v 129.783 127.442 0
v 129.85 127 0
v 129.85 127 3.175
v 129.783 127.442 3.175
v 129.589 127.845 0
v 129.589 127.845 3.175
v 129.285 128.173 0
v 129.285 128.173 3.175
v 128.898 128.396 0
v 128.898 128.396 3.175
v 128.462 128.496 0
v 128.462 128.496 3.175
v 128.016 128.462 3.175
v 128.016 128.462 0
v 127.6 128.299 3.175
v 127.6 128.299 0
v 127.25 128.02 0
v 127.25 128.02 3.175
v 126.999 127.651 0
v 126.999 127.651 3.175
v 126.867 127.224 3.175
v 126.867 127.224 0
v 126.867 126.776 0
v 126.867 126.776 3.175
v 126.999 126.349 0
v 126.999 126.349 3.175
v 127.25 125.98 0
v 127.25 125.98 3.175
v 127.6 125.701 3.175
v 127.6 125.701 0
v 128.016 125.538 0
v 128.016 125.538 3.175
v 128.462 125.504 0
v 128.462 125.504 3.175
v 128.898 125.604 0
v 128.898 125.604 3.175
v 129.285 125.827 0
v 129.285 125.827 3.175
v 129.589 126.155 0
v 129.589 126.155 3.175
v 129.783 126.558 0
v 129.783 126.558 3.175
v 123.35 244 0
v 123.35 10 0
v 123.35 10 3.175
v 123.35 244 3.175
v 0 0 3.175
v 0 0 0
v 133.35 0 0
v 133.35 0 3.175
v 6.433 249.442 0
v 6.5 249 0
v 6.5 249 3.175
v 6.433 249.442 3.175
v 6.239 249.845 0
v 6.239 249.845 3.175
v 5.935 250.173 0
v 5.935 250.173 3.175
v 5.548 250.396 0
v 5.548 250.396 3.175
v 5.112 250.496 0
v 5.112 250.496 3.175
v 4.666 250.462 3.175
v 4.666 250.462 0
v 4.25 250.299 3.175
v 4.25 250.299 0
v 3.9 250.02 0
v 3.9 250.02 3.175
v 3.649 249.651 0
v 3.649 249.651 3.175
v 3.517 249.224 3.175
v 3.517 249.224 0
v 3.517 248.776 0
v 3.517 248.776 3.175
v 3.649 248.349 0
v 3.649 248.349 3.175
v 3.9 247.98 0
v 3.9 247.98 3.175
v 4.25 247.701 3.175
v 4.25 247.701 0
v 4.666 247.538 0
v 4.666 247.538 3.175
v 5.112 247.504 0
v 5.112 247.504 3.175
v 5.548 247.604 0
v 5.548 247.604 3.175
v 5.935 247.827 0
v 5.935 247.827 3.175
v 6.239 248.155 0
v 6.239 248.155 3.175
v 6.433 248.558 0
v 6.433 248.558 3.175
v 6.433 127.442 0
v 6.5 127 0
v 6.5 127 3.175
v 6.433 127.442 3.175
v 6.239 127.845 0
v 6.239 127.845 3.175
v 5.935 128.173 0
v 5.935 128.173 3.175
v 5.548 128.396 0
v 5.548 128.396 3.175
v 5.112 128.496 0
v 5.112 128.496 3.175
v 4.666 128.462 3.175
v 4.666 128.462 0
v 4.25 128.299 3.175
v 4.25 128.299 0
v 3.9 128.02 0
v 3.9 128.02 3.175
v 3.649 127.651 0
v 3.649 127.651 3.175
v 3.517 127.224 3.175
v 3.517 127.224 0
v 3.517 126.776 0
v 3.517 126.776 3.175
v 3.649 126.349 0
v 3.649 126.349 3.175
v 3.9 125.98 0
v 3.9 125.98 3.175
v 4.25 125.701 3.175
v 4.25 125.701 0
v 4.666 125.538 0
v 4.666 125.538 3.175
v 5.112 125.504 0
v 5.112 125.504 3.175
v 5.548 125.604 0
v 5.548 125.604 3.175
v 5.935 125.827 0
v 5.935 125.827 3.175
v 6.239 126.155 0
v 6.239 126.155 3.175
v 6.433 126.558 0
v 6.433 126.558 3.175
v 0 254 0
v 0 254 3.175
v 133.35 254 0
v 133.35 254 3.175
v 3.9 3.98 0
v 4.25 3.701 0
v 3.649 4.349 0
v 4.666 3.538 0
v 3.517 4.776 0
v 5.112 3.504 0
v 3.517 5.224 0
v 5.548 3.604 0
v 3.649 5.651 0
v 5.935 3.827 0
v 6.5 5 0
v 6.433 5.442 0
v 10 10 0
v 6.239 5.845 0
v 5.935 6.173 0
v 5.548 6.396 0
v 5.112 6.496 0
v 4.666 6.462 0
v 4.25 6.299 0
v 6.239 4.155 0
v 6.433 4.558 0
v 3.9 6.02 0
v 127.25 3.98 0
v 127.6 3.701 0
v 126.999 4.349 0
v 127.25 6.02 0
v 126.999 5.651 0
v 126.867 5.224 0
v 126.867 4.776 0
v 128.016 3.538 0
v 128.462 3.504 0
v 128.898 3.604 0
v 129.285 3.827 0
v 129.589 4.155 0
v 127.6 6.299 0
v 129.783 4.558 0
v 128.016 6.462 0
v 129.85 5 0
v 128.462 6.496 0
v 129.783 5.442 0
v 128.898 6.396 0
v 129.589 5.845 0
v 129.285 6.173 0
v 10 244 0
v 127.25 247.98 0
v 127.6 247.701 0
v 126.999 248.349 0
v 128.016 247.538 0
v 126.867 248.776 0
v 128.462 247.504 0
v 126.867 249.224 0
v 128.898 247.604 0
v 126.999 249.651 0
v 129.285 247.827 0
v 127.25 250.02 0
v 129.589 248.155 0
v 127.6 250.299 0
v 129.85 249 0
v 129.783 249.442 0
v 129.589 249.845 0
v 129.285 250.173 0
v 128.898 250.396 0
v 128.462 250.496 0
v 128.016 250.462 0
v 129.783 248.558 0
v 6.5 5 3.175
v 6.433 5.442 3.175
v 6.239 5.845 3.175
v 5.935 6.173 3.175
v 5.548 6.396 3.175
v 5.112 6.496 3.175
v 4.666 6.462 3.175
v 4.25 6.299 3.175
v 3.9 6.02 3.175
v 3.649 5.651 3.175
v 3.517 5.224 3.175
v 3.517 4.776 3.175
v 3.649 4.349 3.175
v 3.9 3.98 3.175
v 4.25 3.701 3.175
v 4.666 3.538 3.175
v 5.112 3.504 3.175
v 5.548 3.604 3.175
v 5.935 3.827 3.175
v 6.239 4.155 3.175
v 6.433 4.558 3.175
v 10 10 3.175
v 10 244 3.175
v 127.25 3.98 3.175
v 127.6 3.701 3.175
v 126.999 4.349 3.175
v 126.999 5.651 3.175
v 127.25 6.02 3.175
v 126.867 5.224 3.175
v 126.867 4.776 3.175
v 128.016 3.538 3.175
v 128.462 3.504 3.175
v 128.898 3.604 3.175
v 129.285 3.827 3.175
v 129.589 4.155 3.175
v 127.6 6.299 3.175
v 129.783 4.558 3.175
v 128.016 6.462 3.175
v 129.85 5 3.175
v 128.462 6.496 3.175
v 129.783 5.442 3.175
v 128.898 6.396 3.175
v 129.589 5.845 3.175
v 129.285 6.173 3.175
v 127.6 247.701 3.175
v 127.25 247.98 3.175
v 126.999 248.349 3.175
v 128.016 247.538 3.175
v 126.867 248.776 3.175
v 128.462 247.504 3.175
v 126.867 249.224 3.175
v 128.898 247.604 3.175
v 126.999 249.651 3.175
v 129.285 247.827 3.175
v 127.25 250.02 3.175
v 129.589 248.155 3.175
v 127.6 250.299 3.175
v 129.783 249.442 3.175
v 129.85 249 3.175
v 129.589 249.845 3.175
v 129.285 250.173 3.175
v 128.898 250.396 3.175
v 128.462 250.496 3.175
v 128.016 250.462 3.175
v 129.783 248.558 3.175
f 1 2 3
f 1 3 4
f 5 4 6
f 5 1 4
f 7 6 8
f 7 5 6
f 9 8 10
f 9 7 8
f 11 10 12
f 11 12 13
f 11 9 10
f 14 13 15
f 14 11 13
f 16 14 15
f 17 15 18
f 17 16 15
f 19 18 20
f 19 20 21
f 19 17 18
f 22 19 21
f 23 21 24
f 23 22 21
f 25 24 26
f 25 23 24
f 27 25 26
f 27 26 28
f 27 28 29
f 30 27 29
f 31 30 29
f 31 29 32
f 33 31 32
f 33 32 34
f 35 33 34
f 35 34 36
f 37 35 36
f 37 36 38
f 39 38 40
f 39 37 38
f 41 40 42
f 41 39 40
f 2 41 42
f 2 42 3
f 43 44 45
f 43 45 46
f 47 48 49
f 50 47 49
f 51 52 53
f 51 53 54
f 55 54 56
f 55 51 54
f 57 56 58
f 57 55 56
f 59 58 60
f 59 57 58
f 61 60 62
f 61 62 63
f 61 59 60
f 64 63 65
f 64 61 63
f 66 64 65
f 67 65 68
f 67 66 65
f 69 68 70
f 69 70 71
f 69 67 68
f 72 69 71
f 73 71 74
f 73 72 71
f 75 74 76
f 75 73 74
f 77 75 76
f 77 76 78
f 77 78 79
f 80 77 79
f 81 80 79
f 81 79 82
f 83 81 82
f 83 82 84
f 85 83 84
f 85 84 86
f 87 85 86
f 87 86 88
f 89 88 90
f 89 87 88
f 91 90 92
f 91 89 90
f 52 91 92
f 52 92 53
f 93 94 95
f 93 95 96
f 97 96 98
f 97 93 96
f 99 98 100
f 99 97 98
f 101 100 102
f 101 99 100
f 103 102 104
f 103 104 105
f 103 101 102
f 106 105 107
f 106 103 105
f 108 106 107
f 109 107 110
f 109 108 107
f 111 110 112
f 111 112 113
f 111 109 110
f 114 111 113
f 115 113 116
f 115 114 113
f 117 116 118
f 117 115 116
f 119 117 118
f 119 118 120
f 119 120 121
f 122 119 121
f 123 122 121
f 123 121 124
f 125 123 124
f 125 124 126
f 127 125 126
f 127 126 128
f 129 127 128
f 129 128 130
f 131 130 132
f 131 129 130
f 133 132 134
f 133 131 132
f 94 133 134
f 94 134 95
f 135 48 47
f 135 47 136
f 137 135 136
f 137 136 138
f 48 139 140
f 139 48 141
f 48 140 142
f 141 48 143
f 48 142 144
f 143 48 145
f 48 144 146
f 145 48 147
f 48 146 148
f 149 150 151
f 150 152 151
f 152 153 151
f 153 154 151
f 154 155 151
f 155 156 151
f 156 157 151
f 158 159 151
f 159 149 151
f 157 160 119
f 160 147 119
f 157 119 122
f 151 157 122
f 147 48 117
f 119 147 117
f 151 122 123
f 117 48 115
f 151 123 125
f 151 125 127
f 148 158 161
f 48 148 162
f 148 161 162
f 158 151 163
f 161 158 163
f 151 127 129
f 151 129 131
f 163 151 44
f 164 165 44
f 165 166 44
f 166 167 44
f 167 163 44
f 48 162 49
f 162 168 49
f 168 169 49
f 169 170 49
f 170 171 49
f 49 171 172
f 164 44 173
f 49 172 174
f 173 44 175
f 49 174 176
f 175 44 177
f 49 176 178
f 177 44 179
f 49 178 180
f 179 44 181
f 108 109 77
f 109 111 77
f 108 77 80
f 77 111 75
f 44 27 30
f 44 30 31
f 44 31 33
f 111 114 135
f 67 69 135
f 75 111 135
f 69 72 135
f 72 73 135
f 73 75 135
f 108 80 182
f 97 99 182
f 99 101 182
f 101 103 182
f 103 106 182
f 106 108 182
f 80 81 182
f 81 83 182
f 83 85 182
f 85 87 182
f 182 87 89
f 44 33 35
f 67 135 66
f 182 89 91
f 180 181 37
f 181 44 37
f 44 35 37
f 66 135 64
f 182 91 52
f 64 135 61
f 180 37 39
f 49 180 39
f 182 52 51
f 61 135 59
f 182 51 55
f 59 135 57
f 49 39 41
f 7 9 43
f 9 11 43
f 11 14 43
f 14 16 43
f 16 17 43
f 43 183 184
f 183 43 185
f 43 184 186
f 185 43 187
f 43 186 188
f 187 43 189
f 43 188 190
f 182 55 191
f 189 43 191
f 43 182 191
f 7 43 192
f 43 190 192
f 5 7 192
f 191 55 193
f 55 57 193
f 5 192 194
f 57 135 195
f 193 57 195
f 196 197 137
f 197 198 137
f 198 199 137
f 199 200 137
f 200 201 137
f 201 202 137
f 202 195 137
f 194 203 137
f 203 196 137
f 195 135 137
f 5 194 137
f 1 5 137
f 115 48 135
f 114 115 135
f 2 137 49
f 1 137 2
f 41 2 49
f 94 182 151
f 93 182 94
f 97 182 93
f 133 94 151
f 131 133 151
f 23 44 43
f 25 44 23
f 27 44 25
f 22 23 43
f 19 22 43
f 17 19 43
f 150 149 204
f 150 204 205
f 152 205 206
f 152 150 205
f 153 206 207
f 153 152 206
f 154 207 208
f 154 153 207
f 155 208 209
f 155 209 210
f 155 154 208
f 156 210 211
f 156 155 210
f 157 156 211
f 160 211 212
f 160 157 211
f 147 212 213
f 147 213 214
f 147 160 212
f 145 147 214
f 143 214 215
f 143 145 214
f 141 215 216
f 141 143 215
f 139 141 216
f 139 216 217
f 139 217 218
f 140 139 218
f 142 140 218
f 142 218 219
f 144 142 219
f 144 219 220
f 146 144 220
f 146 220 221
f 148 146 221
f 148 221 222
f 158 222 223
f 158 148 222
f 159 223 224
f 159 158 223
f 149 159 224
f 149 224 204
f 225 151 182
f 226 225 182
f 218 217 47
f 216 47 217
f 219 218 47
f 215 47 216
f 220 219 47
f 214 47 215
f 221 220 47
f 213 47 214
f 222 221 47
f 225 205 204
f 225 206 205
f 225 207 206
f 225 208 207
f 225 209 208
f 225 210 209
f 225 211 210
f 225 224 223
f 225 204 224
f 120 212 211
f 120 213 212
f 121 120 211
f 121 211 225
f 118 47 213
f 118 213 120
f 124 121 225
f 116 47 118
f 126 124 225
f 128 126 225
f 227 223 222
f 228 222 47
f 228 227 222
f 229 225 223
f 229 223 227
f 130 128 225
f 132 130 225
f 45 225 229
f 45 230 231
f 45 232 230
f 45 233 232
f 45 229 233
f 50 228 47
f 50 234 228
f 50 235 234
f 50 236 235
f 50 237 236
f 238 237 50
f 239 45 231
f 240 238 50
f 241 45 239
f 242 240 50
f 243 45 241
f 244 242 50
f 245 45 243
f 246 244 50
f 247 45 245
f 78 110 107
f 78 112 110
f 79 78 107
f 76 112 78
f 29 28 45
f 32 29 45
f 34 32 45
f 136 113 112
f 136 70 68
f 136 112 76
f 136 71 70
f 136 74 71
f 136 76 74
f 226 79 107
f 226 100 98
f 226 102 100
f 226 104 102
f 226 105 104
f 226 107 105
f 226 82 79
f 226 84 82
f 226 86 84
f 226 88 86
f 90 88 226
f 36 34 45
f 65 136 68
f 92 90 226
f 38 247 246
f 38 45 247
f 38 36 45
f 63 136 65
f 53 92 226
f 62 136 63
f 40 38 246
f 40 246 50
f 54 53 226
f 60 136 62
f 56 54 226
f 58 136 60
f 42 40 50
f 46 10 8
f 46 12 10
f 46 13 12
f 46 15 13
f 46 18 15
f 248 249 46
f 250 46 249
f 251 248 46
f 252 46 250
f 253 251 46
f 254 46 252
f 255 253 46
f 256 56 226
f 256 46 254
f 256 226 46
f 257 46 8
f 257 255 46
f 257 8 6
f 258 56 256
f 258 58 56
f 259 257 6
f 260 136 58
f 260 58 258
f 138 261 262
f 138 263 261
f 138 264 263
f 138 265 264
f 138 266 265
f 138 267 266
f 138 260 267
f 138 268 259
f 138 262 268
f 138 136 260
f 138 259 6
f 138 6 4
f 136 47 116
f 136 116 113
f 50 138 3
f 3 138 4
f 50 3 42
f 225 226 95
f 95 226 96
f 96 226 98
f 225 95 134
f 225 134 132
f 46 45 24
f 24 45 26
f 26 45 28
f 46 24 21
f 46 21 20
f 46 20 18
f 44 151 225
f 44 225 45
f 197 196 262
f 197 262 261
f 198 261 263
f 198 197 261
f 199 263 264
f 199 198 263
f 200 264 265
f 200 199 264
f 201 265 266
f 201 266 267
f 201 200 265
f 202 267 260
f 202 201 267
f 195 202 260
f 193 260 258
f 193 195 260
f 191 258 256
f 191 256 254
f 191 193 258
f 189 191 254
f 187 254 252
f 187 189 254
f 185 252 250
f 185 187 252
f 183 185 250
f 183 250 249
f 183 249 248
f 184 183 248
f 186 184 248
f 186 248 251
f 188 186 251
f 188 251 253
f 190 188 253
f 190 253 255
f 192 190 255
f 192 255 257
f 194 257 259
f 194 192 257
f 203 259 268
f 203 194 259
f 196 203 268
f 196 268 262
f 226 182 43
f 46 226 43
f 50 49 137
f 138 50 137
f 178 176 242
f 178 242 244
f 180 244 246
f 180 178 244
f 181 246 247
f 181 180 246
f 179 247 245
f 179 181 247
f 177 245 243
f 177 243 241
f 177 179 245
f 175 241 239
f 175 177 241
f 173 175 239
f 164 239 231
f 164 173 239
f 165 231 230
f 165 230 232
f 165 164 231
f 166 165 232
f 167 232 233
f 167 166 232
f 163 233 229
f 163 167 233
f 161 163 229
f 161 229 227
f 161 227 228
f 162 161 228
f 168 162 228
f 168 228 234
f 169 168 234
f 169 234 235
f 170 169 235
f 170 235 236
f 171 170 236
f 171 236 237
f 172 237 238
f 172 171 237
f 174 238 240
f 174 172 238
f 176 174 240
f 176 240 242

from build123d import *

# Parameters (mm, degrees)
SKETCH1_W           = 133.35
SKETCH1_H           = 254
SKETCH1_R           = 1.5
SKETCH1_W_2         = 113.35
SKETCH1_H_2         = 234
BOSS_EXTRUDE1_DEPTH = 3.175


with BuildPart() as part:
    # Sketch1 → Boss-Extrude1 (new body)
    with BuildSketch(Plane.XY):
        with Locations((66.675, 127)):
            Rectangle(SKETCH1_W, SKETCH1_H)
        with Locations((5, 5)):
            Circle(SKETCH1_R, mode=Mode.SUBTRACT)
        with Locations((5, 249)):
            Circle(SKETCH1_R, mode=Mode.SUBTRACT)
        with Locations((5, 127)):
            Circle(SKETCH1_R, mode=Mode.SUBTRACT)
        with Locations((128.35, 249)):
            Circle(SKETCH1_R, mode=Mode.SUBTRACT)
        with Locations((128.35, 127)):
            Circle(SKETCH1_R, mode=Mode.SUBTRACT)
        with Locations((128.35, 5)):
            Circle(SKETCH1_R, mode=Mode.SUBTRACT)
        with Locations((66.675, 127)):
            Rectangle(SKETCH1_W_2, SKETCH1_H_2, mode=Mode.SUBTRACT)
    extrude(amount=BOSS_EXTRUDE1_DEPTH)


solid = part.part
